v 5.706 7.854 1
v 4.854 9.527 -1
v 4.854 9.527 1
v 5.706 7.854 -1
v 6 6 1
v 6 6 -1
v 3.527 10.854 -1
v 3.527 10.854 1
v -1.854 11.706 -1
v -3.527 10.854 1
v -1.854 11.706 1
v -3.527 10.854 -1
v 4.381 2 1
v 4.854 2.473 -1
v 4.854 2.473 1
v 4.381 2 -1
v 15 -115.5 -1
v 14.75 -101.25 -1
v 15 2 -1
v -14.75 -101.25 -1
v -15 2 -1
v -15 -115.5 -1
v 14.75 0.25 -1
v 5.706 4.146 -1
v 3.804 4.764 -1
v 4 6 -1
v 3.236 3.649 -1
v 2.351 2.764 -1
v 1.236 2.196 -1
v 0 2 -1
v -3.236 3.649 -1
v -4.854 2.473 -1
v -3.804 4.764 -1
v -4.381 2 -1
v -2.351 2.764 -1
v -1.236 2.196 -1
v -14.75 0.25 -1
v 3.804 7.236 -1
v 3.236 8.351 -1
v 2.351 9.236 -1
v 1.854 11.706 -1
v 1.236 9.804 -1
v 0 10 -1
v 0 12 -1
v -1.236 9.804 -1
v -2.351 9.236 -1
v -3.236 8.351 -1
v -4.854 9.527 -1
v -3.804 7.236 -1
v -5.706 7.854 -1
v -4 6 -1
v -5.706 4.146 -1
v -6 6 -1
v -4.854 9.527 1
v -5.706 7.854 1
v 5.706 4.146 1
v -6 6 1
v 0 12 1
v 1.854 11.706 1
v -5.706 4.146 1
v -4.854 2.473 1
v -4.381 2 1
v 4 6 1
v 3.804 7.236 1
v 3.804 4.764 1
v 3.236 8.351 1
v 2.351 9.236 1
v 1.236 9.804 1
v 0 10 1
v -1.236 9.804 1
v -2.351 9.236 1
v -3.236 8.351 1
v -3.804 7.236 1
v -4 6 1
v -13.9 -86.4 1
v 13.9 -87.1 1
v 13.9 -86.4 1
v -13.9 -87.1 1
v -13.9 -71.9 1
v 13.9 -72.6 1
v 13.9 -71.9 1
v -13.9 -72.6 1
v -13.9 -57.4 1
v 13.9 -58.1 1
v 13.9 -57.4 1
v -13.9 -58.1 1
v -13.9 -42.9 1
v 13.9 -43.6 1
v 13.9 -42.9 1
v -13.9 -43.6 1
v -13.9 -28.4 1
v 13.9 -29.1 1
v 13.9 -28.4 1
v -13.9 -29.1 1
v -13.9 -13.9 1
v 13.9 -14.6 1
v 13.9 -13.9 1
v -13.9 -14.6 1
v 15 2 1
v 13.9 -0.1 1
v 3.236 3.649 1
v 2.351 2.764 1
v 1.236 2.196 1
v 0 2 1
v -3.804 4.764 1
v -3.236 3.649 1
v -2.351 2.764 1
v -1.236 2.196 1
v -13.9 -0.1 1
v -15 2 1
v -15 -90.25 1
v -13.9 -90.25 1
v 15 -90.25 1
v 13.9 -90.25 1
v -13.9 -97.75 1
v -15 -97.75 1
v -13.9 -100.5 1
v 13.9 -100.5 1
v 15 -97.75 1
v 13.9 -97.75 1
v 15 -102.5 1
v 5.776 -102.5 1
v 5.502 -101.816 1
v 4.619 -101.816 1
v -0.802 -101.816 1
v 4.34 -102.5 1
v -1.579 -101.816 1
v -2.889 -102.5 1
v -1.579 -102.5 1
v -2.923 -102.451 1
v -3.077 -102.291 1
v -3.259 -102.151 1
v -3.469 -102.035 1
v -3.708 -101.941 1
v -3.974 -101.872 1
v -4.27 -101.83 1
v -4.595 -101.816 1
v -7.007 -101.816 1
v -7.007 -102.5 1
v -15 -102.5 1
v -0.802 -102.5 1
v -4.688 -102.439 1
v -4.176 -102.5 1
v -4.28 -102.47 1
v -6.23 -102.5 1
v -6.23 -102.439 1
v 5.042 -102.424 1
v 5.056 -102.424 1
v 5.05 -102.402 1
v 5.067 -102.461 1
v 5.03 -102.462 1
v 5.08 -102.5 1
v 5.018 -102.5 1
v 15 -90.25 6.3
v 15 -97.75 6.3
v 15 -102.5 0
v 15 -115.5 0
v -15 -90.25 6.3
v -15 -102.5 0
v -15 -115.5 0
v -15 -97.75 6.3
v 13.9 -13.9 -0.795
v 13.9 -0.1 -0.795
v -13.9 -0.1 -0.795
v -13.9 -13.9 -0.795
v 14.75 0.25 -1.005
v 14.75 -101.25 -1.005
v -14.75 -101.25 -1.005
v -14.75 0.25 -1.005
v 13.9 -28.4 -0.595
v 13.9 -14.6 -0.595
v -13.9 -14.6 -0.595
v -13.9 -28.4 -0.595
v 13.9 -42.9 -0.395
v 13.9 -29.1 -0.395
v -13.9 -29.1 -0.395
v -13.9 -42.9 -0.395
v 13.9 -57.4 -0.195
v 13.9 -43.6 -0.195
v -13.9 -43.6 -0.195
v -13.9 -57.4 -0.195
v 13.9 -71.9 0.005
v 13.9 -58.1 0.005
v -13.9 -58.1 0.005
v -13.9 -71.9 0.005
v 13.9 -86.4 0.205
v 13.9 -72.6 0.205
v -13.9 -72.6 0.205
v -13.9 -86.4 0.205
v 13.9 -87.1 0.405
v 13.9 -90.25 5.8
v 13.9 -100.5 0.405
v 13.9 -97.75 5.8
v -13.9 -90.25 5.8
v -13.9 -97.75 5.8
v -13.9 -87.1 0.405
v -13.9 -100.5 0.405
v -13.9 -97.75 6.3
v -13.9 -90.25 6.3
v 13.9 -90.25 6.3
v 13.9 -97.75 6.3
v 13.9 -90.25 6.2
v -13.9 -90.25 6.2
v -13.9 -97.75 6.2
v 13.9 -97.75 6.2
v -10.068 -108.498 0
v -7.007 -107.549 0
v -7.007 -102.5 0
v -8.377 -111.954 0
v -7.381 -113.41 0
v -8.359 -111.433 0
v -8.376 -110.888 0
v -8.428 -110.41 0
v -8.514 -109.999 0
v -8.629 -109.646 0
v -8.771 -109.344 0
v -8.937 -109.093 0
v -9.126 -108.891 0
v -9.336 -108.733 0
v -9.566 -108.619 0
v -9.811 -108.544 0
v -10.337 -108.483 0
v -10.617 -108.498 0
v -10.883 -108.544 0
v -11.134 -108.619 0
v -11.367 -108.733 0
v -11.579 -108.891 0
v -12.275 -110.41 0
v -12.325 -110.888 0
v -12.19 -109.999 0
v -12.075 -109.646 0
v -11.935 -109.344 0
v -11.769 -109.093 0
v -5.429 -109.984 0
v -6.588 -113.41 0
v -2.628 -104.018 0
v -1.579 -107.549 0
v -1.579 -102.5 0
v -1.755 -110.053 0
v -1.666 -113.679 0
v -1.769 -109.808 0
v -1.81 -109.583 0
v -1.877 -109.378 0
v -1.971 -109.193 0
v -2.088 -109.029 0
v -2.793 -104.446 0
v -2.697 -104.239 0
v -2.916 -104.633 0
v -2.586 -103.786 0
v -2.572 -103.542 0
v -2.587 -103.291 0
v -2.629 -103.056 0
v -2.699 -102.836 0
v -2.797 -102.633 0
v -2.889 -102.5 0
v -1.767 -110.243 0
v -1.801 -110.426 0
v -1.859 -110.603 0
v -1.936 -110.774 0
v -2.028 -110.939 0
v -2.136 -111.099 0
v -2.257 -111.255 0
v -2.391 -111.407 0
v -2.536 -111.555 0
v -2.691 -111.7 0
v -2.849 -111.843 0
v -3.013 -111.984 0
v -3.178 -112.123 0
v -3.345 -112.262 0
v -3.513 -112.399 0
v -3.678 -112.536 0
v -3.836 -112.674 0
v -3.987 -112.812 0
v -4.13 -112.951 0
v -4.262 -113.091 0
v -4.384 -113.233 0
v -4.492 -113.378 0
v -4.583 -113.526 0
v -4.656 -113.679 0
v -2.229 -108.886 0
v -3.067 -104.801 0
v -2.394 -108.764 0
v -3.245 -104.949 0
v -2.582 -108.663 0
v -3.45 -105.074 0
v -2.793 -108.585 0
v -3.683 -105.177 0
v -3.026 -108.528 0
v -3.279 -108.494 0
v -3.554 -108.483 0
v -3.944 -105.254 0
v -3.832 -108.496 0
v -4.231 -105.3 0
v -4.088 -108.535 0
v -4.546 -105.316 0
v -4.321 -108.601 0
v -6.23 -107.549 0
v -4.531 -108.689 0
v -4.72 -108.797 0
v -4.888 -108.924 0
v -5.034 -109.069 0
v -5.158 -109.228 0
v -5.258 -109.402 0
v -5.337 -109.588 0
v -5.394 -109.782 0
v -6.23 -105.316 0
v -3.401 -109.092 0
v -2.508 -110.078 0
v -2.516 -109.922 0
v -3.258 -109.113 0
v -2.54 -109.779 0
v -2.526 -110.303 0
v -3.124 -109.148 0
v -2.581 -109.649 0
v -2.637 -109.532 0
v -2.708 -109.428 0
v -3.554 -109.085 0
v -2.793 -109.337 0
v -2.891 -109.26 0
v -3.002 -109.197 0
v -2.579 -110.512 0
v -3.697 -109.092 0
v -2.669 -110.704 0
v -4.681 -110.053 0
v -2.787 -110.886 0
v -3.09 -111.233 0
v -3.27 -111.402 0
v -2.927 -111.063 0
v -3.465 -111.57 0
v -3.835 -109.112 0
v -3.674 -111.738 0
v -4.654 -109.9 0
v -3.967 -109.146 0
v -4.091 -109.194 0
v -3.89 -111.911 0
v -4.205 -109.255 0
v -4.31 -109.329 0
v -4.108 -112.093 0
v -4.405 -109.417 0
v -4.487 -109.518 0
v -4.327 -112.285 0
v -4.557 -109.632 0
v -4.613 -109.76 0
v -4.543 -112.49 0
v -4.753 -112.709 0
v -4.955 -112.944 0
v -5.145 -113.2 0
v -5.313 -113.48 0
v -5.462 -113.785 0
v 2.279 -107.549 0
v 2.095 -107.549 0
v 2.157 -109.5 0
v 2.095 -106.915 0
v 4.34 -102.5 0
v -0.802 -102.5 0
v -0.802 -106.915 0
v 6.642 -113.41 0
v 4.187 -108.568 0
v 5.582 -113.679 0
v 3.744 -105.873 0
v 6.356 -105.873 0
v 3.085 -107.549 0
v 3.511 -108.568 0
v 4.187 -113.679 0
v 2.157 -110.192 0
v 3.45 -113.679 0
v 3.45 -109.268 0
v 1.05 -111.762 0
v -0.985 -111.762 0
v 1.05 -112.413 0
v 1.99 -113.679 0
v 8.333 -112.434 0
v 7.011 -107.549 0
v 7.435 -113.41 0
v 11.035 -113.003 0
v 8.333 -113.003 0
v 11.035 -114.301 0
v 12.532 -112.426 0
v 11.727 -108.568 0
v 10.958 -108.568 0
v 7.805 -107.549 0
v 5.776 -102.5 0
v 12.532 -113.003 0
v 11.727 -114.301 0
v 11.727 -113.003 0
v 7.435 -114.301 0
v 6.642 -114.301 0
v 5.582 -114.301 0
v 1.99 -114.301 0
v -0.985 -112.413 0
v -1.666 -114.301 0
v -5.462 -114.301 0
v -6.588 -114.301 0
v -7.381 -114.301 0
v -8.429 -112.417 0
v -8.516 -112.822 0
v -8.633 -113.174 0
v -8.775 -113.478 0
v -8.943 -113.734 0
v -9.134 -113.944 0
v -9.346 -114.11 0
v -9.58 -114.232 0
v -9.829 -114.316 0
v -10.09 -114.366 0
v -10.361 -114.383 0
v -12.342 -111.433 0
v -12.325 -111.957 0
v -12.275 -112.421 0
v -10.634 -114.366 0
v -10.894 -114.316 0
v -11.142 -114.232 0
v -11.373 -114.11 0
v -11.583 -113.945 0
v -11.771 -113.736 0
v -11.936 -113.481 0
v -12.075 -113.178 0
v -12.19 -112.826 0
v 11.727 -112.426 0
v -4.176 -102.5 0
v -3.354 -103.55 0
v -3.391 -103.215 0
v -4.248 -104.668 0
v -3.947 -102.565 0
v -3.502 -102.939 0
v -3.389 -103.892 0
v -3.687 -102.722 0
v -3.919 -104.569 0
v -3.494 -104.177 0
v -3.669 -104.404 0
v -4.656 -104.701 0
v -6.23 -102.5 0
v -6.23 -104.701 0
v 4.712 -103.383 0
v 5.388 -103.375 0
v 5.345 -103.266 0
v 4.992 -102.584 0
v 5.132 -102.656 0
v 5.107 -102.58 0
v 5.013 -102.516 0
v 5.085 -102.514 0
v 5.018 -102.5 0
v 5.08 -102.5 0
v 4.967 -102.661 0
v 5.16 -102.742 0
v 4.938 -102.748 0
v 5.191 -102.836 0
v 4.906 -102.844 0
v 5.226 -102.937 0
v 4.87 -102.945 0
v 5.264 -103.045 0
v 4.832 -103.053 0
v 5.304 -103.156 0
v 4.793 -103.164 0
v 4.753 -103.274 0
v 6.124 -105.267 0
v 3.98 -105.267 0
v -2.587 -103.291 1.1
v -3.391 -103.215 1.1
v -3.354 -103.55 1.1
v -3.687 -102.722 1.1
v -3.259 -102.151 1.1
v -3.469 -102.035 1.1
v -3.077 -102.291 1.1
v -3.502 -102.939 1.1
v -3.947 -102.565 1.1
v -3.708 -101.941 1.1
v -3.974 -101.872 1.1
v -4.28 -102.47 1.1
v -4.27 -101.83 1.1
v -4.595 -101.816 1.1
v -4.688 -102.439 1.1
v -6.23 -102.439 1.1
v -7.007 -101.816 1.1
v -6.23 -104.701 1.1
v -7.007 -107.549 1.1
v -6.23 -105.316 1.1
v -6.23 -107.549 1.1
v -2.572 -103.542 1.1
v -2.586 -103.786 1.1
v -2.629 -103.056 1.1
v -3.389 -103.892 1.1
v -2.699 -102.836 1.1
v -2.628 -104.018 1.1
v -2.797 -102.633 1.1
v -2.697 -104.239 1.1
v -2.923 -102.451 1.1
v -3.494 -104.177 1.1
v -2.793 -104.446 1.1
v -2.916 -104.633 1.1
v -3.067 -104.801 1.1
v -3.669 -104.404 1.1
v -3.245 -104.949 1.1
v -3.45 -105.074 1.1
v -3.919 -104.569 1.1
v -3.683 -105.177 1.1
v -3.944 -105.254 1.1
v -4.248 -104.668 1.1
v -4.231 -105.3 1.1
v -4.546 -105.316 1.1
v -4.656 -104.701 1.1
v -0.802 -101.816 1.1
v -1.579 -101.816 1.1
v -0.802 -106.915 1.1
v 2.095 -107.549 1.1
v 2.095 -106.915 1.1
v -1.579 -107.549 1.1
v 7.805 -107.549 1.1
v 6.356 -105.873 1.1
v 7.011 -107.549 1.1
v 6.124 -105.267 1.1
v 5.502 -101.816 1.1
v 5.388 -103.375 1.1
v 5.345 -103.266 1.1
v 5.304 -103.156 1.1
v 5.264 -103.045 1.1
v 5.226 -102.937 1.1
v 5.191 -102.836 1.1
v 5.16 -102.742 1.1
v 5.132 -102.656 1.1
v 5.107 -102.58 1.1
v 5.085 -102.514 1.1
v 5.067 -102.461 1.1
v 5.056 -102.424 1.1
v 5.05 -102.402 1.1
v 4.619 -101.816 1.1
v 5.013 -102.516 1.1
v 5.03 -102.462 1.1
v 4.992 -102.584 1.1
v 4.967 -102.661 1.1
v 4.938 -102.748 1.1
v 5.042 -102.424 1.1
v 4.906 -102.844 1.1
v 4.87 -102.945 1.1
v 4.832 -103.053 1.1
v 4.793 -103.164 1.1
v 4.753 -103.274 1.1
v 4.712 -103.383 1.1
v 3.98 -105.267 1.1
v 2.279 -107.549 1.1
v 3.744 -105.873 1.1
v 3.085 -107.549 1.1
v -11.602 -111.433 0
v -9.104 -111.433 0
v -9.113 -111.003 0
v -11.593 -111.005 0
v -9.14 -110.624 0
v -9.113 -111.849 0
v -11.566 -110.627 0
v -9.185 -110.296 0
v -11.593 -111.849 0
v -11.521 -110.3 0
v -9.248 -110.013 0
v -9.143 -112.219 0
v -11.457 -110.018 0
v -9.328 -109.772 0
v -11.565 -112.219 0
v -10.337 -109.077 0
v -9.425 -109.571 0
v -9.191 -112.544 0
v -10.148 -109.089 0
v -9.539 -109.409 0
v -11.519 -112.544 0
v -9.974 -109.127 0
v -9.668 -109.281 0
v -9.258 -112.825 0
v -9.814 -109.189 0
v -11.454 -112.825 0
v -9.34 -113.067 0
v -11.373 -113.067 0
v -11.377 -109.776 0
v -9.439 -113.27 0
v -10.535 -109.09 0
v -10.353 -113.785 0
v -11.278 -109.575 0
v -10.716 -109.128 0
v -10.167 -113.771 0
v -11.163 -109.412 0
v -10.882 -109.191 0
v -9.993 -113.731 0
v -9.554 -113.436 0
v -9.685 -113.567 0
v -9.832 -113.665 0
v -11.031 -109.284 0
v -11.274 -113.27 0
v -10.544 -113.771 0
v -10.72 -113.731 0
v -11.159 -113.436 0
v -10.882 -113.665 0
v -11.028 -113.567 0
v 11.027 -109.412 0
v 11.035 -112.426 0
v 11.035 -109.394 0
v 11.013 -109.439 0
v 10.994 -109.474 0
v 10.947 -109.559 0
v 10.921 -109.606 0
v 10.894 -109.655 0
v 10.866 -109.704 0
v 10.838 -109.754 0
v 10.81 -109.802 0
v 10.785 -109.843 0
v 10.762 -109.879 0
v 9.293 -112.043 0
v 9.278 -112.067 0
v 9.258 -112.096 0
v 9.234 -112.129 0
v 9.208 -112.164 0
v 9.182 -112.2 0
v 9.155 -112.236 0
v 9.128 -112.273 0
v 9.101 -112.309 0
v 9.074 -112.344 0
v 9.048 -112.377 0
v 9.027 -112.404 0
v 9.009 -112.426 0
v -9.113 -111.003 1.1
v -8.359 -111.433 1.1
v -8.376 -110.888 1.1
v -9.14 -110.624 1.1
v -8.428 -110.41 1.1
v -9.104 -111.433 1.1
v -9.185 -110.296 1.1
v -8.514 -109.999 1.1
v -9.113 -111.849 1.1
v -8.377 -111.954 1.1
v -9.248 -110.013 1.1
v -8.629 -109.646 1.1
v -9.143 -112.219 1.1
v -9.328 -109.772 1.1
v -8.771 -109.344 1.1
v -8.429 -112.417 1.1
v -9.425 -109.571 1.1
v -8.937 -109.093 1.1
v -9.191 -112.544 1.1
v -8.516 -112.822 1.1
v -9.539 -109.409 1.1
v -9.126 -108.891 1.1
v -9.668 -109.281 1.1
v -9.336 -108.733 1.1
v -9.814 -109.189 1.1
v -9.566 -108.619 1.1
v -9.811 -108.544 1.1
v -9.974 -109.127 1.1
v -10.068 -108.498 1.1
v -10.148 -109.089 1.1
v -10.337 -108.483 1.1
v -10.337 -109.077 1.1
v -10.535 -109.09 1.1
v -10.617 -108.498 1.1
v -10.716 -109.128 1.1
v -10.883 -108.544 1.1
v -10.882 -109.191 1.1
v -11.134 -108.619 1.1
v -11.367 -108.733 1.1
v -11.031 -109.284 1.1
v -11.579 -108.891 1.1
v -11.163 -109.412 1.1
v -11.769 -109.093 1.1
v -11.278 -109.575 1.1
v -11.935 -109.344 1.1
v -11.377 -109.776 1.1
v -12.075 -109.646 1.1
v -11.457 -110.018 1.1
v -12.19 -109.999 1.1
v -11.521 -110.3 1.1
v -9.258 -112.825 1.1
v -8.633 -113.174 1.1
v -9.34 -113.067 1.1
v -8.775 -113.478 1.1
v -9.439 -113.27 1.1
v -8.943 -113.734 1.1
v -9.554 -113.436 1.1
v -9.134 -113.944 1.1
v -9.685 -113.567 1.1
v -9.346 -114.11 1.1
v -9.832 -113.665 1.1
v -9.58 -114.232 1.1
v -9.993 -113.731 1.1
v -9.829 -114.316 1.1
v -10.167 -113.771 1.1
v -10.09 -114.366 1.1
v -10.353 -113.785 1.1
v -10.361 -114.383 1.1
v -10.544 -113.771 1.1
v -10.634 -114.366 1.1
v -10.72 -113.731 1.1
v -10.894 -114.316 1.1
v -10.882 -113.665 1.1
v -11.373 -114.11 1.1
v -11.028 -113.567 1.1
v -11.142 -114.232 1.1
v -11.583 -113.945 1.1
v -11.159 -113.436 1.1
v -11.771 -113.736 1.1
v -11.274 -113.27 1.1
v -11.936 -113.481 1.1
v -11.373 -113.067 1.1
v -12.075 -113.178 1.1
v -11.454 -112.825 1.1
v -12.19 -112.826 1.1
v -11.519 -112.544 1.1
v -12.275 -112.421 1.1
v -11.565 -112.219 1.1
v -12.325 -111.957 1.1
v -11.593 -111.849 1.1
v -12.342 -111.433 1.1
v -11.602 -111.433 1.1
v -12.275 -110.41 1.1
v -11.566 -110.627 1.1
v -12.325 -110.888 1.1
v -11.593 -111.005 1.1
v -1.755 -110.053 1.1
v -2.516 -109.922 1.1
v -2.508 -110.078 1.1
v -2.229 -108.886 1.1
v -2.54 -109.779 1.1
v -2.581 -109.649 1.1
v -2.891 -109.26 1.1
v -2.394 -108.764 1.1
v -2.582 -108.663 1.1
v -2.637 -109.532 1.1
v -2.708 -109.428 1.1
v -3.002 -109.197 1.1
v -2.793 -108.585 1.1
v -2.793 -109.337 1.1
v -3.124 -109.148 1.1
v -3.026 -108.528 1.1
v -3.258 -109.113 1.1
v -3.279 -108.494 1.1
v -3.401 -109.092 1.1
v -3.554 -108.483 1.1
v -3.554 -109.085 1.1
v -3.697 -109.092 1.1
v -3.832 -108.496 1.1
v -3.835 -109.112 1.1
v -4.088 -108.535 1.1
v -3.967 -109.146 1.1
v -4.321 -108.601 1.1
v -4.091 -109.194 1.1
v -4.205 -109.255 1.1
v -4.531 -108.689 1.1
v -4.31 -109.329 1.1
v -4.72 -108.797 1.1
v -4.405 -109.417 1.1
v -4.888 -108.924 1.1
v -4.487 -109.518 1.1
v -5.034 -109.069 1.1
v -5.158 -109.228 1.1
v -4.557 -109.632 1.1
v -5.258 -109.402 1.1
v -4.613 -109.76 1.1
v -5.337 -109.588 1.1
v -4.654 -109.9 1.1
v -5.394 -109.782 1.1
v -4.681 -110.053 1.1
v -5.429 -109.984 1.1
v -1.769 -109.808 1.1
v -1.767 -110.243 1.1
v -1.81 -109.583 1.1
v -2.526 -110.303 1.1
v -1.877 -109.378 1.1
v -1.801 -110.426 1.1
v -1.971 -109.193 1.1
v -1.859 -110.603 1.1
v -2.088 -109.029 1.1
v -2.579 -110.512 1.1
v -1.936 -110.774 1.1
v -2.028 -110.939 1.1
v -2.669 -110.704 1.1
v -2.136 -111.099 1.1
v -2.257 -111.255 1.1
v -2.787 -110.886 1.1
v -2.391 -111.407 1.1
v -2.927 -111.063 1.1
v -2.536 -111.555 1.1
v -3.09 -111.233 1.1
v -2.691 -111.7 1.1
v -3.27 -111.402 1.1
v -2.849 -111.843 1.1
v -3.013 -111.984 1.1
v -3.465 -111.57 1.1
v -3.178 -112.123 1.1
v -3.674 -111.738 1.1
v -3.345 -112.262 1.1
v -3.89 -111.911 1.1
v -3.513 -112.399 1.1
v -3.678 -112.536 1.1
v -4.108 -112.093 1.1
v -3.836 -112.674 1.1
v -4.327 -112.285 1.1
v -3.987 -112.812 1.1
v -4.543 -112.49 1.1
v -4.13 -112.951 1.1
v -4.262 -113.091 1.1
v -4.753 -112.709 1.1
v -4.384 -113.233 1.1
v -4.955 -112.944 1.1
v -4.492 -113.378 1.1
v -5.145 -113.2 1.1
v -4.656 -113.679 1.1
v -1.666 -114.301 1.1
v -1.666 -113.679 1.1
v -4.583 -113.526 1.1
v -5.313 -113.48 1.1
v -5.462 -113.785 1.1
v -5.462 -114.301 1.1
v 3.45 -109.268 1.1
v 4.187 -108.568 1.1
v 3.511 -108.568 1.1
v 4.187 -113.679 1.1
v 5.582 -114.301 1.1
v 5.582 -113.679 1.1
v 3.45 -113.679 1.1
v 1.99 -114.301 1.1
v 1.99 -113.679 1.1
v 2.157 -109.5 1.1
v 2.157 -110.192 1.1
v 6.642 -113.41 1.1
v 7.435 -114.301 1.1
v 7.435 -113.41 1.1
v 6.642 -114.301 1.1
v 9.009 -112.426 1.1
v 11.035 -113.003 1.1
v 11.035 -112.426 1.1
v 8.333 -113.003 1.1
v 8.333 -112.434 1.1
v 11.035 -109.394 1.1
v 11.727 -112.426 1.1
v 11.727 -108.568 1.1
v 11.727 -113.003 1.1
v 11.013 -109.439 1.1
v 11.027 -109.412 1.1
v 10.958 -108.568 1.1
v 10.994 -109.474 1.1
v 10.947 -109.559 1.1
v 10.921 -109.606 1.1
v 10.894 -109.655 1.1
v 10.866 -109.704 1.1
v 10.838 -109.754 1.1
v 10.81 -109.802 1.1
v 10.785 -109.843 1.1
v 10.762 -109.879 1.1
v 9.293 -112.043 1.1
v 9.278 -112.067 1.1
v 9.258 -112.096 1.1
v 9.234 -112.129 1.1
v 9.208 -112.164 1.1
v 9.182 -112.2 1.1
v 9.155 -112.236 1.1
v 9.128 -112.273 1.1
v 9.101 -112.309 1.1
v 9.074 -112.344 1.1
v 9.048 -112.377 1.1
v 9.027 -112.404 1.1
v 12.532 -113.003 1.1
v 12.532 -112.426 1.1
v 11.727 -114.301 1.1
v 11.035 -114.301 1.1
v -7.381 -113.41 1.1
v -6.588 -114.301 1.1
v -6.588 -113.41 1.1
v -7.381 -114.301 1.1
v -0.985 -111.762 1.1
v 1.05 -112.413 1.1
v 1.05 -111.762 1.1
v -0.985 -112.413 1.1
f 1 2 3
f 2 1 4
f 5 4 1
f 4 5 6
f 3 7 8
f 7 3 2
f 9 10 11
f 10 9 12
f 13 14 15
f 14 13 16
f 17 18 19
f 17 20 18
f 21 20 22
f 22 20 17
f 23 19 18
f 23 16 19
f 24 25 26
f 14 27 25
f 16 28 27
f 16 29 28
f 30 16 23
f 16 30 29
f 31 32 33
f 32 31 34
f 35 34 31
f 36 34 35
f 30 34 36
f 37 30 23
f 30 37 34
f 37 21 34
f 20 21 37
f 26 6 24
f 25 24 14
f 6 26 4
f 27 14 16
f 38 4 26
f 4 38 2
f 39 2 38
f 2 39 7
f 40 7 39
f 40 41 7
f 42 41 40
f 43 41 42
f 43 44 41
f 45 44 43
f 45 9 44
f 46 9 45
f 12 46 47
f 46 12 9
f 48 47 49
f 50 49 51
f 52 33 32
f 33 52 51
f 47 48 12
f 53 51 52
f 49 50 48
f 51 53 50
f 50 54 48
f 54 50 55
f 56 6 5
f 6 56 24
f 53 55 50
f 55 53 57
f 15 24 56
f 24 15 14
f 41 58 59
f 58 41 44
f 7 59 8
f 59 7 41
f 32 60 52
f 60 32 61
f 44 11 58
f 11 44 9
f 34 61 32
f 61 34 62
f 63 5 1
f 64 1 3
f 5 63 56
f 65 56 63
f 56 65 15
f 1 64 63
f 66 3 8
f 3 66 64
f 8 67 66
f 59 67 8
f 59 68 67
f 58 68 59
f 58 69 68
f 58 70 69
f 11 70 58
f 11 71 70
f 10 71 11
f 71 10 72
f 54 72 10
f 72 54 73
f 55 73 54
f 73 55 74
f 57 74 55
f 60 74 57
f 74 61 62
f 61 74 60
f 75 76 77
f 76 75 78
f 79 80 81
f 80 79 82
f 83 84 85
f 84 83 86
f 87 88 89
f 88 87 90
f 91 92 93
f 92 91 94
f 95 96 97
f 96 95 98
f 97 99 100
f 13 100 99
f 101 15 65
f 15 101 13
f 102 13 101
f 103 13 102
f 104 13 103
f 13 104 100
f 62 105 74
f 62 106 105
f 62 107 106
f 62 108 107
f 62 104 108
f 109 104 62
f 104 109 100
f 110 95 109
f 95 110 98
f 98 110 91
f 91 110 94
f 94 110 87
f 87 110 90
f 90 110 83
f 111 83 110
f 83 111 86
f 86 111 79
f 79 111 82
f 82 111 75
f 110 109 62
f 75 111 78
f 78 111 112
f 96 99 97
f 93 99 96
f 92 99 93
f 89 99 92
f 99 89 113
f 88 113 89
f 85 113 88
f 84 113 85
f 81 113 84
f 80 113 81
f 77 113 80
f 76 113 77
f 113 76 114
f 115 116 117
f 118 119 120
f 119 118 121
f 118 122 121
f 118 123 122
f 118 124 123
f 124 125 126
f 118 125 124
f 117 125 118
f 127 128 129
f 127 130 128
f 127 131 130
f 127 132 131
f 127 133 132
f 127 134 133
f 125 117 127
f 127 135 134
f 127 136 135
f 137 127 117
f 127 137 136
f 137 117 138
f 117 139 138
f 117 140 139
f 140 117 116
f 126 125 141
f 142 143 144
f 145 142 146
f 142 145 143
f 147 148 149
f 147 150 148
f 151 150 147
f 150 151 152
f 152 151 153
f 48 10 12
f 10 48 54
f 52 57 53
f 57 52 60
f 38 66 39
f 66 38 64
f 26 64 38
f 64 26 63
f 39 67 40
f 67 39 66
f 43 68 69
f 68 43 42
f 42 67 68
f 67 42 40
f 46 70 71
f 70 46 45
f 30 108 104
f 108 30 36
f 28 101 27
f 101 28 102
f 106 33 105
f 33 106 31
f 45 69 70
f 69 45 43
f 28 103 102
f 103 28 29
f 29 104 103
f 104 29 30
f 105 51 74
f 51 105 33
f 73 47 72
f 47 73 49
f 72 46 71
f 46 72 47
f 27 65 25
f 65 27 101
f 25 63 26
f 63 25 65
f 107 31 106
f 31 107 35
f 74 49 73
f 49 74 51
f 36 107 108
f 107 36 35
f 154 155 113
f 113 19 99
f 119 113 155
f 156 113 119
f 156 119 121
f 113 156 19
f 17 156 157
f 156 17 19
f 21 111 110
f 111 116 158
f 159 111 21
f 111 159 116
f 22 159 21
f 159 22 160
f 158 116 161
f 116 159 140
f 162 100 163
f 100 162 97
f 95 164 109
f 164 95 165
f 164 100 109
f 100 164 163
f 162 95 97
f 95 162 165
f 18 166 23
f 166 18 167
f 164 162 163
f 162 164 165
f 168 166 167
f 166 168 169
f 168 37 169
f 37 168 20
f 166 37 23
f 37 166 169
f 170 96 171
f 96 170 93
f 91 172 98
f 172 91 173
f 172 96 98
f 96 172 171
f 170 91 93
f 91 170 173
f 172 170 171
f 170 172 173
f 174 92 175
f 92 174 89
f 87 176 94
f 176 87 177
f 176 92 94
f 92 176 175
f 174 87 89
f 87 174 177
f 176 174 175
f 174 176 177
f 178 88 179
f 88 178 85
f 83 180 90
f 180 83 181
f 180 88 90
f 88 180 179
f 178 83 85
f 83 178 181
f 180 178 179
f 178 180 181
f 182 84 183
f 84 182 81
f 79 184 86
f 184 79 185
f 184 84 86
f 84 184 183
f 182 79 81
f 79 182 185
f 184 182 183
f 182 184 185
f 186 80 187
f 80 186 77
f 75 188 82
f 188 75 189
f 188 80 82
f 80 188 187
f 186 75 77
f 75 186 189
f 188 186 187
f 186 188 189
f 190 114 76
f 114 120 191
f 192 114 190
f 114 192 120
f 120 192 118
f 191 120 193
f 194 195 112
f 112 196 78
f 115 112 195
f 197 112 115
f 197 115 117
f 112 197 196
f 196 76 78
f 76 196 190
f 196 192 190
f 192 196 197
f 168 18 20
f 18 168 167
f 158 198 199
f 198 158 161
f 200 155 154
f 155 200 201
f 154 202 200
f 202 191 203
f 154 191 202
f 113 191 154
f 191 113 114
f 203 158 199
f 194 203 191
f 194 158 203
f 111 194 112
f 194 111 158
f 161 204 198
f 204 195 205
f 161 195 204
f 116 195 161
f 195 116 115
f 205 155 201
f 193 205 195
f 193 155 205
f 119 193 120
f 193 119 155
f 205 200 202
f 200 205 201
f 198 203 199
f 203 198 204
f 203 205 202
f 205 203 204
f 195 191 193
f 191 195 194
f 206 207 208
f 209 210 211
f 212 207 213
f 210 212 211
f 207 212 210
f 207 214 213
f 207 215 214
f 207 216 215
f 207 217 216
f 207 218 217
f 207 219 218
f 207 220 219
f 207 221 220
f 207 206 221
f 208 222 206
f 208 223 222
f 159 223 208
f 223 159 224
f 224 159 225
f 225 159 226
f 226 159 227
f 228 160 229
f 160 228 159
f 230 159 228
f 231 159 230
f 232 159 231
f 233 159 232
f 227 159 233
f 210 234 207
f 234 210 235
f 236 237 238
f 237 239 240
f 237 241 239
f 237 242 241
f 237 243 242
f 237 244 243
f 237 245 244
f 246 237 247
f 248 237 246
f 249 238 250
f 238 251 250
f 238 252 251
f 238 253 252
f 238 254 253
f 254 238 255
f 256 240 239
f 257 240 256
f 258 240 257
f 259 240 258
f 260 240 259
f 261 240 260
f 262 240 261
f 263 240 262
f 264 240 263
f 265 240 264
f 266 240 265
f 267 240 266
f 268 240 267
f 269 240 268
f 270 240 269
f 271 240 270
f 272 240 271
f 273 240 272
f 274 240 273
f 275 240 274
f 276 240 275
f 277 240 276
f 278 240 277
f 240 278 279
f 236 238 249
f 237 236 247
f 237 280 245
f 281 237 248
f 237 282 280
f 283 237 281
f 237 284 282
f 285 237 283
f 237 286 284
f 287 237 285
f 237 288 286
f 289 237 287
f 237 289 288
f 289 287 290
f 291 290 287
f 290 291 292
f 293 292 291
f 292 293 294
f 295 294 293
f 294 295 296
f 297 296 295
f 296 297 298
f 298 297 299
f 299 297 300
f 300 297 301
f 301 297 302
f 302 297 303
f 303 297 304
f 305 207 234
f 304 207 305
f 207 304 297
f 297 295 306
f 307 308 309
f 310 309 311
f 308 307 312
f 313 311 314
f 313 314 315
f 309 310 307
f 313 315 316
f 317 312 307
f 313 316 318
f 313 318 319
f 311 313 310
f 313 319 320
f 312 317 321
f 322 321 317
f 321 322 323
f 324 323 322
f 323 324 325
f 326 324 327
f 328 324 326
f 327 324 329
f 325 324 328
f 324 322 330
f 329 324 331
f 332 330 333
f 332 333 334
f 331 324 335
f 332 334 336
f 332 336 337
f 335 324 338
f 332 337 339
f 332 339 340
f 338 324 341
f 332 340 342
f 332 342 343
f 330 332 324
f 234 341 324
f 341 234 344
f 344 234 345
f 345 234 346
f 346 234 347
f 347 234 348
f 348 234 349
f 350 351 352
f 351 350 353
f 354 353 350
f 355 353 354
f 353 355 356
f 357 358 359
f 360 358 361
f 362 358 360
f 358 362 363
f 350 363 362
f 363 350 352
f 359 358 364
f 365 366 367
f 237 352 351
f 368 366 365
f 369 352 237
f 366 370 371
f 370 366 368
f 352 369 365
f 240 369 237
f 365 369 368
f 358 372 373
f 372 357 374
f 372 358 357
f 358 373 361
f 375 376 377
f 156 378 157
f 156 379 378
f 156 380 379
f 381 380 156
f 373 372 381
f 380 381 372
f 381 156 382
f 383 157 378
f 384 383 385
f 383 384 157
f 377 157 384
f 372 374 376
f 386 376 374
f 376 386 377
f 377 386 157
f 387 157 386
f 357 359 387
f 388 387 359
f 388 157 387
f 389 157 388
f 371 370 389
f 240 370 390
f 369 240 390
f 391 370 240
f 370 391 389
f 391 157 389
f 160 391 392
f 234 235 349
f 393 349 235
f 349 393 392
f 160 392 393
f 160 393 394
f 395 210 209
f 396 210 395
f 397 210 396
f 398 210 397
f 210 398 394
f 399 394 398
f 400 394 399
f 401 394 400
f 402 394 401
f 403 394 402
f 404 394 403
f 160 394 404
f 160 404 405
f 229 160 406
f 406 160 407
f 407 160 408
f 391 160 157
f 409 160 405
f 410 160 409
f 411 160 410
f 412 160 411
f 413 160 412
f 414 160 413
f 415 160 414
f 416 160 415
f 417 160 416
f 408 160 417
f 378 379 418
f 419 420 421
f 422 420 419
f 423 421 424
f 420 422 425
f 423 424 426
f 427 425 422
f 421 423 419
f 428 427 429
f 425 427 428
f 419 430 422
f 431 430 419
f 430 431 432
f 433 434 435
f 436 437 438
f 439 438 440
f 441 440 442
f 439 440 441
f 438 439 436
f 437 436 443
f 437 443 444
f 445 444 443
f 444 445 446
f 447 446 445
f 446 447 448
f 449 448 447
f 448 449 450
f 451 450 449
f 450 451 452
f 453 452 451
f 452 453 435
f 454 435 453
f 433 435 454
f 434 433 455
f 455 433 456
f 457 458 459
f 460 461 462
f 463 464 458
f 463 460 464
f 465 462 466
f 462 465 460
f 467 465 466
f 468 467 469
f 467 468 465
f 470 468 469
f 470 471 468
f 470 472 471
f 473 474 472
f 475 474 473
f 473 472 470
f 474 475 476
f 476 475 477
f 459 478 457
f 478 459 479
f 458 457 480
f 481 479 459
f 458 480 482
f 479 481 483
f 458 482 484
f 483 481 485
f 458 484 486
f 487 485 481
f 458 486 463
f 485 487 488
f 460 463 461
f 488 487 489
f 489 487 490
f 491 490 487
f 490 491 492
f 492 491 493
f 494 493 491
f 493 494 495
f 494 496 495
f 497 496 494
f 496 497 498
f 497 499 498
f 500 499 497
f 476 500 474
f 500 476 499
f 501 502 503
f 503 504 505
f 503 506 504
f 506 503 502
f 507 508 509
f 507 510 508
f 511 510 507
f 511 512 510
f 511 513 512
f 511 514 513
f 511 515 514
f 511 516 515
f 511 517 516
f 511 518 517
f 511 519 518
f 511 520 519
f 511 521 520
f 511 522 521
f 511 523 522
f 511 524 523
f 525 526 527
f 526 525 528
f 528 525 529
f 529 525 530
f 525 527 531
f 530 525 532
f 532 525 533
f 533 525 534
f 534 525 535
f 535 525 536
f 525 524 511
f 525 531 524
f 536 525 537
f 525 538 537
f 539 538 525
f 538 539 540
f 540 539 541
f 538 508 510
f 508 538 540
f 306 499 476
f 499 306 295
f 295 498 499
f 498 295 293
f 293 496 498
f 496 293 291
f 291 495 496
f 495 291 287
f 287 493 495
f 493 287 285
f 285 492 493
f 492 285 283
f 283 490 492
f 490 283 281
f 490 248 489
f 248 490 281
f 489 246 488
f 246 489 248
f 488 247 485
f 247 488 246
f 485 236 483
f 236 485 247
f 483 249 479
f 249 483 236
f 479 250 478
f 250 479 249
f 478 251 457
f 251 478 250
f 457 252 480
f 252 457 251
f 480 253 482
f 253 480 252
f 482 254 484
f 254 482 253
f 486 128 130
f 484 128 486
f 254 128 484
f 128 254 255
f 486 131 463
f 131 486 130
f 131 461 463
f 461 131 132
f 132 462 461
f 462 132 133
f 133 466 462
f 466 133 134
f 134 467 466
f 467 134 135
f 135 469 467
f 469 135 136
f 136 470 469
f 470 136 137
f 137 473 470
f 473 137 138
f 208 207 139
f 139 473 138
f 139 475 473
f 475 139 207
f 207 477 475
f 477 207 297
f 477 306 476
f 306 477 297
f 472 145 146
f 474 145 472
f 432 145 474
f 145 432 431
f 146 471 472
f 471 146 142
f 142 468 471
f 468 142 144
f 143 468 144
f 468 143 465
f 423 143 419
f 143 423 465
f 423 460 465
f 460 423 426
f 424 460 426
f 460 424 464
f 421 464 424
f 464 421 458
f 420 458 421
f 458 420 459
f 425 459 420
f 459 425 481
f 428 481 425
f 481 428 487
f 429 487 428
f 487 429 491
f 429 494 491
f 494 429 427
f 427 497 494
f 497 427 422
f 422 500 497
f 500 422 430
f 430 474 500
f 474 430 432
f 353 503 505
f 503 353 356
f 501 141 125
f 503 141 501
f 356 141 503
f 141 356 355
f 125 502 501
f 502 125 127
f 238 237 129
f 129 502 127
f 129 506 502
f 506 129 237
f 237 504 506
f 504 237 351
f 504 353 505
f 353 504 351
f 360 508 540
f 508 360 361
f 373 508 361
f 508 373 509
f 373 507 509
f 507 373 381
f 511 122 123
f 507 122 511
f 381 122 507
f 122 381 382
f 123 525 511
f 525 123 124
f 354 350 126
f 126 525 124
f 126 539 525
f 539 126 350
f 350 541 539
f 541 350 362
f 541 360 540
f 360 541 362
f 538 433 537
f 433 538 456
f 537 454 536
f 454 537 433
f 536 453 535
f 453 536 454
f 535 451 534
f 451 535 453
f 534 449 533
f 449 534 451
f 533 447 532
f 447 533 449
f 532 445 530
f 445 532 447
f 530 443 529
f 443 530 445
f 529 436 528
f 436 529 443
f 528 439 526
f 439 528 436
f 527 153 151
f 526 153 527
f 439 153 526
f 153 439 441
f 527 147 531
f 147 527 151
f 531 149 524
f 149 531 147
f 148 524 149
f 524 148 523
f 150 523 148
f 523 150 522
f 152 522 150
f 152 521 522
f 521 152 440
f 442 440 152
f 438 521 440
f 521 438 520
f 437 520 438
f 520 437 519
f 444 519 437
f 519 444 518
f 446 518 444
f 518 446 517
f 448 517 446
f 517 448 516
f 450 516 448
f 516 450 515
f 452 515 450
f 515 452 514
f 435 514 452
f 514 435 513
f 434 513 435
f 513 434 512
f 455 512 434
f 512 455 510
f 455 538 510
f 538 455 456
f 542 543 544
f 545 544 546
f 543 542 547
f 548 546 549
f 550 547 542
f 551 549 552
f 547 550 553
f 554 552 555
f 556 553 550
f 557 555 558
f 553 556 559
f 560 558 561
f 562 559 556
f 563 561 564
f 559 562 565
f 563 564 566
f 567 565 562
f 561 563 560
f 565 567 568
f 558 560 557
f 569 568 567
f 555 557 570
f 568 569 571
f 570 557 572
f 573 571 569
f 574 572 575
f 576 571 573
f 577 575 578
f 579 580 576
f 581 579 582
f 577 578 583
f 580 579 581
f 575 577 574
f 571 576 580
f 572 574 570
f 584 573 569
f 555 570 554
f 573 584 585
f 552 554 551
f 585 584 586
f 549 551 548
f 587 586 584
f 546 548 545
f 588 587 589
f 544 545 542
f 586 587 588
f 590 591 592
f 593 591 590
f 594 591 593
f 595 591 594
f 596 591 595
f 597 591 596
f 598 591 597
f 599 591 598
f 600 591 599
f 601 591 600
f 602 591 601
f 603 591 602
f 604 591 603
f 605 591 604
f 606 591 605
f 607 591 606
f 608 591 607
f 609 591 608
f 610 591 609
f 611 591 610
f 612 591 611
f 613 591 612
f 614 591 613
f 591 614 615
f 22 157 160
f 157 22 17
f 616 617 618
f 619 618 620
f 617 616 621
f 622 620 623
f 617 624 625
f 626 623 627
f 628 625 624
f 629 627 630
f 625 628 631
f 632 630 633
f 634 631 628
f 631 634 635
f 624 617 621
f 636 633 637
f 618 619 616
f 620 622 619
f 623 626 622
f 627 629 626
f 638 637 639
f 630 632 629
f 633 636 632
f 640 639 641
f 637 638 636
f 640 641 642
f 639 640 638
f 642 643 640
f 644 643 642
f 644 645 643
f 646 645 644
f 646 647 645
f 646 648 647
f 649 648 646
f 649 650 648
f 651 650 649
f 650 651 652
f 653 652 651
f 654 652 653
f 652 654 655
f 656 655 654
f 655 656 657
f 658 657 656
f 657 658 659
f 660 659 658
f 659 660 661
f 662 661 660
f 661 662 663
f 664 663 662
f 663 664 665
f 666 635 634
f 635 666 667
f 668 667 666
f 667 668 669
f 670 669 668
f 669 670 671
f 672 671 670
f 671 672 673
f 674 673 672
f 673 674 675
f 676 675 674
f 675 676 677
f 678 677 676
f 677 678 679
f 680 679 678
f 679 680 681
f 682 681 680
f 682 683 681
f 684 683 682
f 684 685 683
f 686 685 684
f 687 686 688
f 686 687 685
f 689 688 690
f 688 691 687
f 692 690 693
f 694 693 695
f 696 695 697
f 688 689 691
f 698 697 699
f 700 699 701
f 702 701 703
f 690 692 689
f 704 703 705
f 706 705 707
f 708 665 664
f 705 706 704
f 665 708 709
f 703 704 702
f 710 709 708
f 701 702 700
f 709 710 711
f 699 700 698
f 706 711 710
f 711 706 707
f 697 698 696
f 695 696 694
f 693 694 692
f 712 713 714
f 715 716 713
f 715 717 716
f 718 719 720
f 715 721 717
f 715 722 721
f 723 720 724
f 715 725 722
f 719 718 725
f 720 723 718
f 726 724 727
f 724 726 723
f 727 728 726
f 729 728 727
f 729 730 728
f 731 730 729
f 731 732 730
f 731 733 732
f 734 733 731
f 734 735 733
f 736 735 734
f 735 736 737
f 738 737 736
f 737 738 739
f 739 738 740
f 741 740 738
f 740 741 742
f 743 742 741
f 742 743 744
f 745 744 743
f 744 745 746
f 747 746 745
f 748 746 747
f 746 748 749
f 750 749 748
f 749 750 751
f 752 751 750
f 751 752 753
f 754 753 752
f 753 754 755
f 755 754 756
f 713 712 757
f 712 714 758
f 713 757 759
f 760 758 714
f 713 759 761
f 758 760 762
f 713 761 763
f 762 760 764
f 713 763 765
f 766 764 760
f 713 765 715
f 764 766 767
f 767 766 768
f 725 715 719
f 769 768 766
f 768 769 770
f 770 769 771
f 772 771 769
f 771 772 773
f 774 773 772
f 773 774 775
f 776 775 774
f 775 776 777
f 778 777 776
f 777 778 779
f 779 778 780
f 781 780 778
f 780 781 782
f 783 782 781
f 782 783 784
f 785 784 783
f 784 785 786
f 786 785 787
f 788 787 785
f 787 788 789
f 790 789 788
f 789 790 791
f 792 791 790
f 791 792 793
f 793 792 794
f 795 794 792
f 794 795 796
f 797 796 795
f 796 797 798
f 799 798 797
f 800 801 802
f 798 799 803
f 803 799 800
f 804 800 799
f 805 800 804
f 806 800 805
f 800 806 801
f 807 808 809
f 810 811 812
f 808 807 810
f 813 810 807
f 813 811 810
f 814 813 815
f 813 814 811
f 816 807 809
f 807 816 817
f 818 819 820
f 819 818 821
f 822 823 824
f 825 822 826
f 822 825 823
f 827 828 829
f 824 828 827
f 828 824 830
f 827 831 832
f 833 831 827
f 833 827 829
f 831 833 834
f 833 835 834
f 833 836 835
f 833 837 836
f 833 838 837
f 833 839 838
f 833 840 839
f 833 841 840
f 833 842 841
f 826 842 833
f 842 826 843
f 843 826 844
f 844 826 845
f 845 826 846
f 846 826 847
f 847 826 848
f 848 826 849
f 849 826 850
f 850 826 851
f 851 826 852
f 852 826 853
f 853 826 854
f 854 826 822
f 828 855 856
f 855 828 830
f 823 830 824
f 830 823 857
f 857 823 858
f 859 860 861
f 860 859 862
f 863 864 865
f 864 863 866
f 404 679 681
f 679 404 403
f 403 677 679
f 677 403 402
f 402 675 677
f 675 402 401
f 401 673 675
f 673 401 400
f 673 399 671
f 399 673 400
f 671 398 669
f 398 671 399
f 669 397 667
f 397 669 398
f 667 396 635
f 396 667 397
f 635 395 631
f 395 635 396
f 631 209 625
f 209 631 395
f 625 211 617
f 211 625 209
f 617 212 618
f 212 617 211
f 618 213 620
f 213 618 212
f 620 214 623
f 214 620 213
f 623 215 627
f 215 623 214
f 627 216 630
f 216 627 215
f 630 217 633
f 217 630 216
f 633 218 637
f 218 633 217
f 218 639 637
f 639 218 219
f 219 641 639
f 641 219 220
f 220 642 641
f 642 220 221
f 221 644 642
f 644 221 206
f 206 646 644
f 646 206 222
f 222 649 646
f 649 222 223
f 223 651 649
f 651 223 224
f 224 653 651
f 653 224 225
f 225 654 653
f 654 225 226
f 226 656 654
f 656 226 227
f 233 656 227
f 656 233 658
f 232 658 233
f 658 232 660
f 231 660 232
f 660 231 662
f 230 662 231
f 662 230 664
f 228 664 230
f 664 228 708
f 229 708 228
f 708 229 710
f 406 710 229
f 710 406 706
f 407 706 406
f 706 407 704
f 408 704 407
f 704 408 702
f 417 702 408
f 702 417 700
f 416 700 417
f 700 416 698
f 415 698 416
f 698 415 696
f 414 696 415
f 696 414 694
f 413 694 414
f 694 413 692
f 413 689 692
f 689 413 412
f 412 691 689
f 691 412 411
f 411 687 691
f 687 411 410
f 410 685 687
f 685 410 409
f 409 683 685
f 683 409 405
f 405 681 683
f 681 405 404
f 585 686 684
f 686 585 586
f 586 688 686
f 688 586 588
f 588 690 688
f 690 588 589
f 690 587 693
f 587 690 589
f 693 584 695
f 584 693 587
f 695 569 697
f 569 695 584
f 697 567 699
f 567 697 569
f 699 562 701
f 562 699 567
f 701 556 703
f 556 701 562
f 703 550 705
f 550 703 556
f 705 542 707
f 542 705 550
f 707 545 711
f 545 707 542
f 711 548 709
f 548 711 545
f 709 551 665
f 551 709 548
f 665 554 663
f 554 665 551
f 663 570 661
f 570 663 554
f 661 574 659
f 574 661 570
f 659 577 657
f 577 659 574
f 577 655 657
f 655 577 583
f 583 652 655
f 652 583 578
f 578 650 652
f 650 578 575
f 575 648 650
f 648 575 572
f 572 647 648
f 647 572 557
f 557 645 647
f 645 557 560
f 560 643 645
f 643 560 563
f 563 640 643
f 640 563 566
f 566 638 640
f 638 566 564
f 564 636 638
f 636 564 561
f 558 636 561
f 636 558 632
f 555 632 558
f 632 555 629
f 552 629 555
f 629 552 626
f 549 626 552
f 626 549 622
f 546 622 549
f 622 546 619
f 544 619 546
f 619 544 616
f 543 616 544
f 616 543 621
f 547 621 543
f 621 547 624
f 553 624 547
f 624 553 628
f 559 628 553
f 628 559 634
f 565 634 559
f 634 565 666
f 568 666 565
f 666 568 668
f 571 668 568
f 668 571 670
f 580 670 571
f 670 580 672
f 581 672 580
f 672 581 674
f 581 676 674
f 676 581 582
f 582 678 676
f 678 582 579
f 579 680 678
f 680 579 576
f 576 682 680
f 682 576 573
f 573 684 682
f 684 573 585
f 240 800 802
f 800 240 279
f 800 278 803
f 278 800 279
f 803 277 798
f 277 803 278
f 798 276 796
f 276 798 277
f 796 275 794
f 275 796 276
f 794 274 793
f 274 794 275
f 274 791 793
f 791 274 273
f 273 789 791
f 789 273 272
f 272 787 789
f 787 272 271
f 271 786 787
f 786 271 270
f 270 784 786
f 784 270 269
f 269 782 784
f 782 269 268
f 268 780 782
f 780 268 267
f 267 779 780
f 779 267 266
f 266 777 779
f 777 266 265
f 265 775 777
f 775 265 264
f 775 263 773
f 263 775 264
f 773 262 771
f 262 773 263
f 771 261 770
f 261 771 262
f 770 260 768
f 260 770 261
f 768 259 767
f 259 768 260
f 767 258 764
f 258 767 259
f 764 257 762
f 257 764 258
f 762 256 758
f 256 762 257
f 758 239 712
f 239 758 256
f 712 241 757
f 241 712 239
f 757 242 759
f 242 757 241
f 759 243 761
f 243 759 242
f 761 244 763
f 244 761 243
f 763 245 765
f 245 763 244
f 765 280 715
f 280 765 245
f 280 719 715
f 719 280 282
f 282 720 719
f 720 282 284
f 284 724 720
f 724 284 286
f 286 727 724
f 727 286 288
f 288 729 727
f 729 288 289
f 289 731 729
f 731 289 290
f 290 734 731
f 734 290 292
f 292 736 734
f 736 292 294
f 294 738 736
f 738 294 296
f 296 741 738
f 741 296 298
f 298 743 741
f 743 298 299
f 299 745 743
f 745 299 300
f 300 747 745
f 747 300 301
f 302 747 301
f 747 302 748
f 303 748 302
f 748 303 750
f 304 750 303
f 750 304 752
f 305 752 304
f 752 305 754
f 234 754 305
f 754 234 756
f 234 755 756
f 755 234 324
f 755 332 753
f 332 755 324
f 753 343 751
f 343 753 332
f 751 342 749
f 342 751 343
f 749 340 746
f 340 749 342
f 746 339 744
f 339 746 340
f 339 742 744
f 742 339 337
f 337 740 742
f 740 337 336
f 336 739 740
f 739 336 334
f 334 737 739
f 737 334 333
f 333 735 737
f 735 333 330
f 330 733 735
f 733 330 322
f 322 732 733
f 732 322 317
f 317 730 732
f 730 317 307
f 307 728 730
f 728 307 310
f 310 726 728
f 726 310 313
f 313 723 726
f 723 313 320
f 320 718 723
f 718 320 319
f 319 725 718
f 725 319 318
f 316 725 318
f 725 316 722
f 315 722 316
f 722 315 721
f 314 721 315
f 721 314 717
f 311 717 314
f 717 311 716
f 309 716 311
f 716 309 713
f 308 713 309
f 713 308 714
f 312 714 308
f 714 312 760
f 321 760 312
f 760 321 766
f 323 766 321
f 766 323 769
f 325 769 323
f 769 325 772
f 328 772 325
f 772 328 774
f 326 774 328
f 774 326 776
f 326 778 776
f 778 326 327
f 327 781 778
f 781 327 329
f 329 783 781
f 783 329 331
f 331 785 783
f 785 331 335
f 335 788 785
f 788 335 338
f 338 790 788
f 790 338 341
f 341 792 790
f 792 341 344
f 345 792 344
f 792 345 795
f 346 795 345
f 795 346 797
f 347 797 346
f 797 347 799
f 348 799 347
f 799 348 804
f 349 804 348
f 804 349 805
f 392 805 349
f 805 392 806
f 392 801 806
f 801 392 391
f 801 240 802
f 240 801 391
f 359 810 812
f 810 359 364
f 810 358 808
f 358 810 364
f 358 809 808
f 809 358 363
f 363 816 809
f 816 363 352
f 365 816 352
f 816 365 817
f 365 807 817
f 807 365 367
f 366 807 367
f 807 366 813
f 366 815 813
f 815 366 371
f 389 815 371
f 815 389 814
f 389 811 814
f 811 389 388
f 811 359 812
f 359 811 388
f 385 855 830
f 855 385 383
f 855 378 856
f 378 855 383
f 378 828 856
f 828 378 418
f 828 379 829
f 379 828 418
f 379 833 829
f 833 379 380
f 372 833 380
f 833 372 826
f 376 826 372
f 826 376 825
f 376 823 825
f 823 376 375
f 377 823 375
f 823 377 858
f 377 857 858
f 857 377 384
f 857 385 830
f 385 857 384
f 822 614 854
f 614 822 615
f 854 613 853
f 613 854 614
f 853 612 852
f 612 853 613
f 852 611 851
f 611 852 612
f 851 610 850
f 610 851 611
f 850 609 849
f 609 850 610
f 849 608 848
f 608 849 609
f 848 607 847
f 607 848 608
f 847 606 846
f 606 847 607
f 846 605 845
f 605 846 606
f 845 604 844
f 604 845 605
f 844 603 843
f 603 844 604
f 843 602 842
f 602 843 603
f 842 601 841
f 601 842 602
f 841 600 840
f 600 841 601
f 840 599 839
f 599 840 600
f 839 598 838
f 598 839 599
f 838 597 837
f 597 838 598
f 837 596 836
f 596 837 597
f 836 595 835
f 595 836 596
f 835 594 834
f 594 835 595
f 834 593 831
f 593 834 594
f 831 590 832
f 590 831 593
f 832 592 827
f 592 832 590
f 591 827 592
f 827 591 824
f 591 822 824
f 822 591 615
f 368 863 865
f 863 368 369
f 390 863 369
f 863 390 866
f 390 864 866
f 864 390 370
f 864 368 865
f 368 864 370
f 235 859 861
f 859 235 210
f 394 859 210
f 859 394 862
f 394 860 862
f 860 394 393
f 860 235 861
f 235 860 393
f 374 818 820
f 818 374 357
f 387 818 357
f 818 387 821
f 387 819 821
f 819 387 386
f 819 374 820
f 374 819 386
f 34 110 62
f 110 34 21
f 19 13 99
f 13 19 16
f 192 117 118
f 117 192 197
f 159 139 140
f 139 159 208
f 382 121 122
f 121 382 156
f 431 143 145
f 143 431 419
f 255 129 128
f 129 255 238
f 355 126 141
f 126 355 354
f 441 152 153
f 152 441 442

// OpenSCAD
frames=7;
layer_step_height=0.2;
$fn=20;
frame_x = 30;
frame_y = 15;
frame_z = 2;
ring_diam = 12;
ring_height=2;
label_x=30;
label_text = "PLA";
font = "Liberation Sans"; //["Liberation Sans", "Liberation Sans:style=Bold", "Liberation Sans:style=Italic", "Liberation Mono", "Liberation Serif", "Ariel"]
letter_size=6;


union()
translate([0,ring_diam/2,0]) ring();
for (i = [1:frames]) {
translate([0,(-1*frame_y/2)*i*2+frame_y/2+0.5*i,0]) frame(i);
}
translate([0,(-1*frame_y/2)*frames*2+frame_y/2+0.5*frames,0]) bridge(frames);
j=frames+1;
translate([0,(-1*frame_y/2)*j*2+frame_y/2+0.5*j+frame_y/4,frame_z/-4]) label();
translate([0,(-1*frame_y/2)*j*2+frame_y/2+0.5*j-3,frame_z/-4]) label2();

translate([0,1,0])
cube([frame_x,2,ring_height],center=true);
translate([0,(-1*frame_y/2)*frames*2+frame_y/2+0.5*frames-frame_y/2,0]) 
cube([frame_x,2,ring_height],center=true);



module ears() {
  translate([-1*frame_x/2+0.5,(-1*frame_y/2)*frames*2+frame_y/2+0.5*frames+frame_y/2,3]) {
    rotate([45,0,0]) cube([1,1,8],center=true);
    translate([0,4,0]) rotate([-45,0,0]) cube([1,1,8],center=true); 
  }
translate([frame_x/2-0.5,(-1*frame_y/2)*frames*2+frame_y/2+0.5*frames+frame_y/2,3]) {
    rotate([45,0,0])  cube([1,1,8],center=true);  
  translate([0,4,0]) rotate([-45,0,0]) cube([1,1,8],center=true); 
}
}

module ring() {
difference() {
    cylinder(r1=ring_diam/2,r2=ring_diam/2,h=ring_height,center =true) ;
    cylinder(r1=ring_diam/2-2,r2=ring_diam/2-2,h=ring_height+1,center=true);   
}
    
}


module frame(num) {
      translate([0,0,-frame_z/2+num*(layer_step_height/2)])
    color("gray")
   cube([frame_x-0.5,frame_y-0.5,num*layer_step_height+0.01],center=true); 
   difference() {
      cube([frame_x,frame_y,frame_z],center=true);
      cube([frame_x-2.2,frame_y-1.2,frame_z+1],center=true);
   } 

}

module bridge(num) {
      translate([0,0,frame_z*3])
 cube([frame_x-1,frame_y/2,layer_step_height*2],center=true); 
    translate([0,0,frame_z*1.6]) 
   difference() {
      cube([frame_x,frame_y/2,frame_z*3+layer_step_height],center=true);
      cube([frame_x-2.2,frame_y/2+2.2,frame_z*3+layer_step_height],center=true);
   } 

}

module label() {
    union()
          cube([label_x,8,1],center=true);
    letter(label_text);    
}

module label2() {
    union()
          cube([frame_x,8,1],center=true);
    letter(str(layer_step_height,"-",layer_step_height*frames));    
}

module letter(l) {
    color("black")
  linear_extrude(height = 1.6) {
    text(l, size = letter_size, font = font, halign = "center", valign = "center", $fn = 16);
  }
}
